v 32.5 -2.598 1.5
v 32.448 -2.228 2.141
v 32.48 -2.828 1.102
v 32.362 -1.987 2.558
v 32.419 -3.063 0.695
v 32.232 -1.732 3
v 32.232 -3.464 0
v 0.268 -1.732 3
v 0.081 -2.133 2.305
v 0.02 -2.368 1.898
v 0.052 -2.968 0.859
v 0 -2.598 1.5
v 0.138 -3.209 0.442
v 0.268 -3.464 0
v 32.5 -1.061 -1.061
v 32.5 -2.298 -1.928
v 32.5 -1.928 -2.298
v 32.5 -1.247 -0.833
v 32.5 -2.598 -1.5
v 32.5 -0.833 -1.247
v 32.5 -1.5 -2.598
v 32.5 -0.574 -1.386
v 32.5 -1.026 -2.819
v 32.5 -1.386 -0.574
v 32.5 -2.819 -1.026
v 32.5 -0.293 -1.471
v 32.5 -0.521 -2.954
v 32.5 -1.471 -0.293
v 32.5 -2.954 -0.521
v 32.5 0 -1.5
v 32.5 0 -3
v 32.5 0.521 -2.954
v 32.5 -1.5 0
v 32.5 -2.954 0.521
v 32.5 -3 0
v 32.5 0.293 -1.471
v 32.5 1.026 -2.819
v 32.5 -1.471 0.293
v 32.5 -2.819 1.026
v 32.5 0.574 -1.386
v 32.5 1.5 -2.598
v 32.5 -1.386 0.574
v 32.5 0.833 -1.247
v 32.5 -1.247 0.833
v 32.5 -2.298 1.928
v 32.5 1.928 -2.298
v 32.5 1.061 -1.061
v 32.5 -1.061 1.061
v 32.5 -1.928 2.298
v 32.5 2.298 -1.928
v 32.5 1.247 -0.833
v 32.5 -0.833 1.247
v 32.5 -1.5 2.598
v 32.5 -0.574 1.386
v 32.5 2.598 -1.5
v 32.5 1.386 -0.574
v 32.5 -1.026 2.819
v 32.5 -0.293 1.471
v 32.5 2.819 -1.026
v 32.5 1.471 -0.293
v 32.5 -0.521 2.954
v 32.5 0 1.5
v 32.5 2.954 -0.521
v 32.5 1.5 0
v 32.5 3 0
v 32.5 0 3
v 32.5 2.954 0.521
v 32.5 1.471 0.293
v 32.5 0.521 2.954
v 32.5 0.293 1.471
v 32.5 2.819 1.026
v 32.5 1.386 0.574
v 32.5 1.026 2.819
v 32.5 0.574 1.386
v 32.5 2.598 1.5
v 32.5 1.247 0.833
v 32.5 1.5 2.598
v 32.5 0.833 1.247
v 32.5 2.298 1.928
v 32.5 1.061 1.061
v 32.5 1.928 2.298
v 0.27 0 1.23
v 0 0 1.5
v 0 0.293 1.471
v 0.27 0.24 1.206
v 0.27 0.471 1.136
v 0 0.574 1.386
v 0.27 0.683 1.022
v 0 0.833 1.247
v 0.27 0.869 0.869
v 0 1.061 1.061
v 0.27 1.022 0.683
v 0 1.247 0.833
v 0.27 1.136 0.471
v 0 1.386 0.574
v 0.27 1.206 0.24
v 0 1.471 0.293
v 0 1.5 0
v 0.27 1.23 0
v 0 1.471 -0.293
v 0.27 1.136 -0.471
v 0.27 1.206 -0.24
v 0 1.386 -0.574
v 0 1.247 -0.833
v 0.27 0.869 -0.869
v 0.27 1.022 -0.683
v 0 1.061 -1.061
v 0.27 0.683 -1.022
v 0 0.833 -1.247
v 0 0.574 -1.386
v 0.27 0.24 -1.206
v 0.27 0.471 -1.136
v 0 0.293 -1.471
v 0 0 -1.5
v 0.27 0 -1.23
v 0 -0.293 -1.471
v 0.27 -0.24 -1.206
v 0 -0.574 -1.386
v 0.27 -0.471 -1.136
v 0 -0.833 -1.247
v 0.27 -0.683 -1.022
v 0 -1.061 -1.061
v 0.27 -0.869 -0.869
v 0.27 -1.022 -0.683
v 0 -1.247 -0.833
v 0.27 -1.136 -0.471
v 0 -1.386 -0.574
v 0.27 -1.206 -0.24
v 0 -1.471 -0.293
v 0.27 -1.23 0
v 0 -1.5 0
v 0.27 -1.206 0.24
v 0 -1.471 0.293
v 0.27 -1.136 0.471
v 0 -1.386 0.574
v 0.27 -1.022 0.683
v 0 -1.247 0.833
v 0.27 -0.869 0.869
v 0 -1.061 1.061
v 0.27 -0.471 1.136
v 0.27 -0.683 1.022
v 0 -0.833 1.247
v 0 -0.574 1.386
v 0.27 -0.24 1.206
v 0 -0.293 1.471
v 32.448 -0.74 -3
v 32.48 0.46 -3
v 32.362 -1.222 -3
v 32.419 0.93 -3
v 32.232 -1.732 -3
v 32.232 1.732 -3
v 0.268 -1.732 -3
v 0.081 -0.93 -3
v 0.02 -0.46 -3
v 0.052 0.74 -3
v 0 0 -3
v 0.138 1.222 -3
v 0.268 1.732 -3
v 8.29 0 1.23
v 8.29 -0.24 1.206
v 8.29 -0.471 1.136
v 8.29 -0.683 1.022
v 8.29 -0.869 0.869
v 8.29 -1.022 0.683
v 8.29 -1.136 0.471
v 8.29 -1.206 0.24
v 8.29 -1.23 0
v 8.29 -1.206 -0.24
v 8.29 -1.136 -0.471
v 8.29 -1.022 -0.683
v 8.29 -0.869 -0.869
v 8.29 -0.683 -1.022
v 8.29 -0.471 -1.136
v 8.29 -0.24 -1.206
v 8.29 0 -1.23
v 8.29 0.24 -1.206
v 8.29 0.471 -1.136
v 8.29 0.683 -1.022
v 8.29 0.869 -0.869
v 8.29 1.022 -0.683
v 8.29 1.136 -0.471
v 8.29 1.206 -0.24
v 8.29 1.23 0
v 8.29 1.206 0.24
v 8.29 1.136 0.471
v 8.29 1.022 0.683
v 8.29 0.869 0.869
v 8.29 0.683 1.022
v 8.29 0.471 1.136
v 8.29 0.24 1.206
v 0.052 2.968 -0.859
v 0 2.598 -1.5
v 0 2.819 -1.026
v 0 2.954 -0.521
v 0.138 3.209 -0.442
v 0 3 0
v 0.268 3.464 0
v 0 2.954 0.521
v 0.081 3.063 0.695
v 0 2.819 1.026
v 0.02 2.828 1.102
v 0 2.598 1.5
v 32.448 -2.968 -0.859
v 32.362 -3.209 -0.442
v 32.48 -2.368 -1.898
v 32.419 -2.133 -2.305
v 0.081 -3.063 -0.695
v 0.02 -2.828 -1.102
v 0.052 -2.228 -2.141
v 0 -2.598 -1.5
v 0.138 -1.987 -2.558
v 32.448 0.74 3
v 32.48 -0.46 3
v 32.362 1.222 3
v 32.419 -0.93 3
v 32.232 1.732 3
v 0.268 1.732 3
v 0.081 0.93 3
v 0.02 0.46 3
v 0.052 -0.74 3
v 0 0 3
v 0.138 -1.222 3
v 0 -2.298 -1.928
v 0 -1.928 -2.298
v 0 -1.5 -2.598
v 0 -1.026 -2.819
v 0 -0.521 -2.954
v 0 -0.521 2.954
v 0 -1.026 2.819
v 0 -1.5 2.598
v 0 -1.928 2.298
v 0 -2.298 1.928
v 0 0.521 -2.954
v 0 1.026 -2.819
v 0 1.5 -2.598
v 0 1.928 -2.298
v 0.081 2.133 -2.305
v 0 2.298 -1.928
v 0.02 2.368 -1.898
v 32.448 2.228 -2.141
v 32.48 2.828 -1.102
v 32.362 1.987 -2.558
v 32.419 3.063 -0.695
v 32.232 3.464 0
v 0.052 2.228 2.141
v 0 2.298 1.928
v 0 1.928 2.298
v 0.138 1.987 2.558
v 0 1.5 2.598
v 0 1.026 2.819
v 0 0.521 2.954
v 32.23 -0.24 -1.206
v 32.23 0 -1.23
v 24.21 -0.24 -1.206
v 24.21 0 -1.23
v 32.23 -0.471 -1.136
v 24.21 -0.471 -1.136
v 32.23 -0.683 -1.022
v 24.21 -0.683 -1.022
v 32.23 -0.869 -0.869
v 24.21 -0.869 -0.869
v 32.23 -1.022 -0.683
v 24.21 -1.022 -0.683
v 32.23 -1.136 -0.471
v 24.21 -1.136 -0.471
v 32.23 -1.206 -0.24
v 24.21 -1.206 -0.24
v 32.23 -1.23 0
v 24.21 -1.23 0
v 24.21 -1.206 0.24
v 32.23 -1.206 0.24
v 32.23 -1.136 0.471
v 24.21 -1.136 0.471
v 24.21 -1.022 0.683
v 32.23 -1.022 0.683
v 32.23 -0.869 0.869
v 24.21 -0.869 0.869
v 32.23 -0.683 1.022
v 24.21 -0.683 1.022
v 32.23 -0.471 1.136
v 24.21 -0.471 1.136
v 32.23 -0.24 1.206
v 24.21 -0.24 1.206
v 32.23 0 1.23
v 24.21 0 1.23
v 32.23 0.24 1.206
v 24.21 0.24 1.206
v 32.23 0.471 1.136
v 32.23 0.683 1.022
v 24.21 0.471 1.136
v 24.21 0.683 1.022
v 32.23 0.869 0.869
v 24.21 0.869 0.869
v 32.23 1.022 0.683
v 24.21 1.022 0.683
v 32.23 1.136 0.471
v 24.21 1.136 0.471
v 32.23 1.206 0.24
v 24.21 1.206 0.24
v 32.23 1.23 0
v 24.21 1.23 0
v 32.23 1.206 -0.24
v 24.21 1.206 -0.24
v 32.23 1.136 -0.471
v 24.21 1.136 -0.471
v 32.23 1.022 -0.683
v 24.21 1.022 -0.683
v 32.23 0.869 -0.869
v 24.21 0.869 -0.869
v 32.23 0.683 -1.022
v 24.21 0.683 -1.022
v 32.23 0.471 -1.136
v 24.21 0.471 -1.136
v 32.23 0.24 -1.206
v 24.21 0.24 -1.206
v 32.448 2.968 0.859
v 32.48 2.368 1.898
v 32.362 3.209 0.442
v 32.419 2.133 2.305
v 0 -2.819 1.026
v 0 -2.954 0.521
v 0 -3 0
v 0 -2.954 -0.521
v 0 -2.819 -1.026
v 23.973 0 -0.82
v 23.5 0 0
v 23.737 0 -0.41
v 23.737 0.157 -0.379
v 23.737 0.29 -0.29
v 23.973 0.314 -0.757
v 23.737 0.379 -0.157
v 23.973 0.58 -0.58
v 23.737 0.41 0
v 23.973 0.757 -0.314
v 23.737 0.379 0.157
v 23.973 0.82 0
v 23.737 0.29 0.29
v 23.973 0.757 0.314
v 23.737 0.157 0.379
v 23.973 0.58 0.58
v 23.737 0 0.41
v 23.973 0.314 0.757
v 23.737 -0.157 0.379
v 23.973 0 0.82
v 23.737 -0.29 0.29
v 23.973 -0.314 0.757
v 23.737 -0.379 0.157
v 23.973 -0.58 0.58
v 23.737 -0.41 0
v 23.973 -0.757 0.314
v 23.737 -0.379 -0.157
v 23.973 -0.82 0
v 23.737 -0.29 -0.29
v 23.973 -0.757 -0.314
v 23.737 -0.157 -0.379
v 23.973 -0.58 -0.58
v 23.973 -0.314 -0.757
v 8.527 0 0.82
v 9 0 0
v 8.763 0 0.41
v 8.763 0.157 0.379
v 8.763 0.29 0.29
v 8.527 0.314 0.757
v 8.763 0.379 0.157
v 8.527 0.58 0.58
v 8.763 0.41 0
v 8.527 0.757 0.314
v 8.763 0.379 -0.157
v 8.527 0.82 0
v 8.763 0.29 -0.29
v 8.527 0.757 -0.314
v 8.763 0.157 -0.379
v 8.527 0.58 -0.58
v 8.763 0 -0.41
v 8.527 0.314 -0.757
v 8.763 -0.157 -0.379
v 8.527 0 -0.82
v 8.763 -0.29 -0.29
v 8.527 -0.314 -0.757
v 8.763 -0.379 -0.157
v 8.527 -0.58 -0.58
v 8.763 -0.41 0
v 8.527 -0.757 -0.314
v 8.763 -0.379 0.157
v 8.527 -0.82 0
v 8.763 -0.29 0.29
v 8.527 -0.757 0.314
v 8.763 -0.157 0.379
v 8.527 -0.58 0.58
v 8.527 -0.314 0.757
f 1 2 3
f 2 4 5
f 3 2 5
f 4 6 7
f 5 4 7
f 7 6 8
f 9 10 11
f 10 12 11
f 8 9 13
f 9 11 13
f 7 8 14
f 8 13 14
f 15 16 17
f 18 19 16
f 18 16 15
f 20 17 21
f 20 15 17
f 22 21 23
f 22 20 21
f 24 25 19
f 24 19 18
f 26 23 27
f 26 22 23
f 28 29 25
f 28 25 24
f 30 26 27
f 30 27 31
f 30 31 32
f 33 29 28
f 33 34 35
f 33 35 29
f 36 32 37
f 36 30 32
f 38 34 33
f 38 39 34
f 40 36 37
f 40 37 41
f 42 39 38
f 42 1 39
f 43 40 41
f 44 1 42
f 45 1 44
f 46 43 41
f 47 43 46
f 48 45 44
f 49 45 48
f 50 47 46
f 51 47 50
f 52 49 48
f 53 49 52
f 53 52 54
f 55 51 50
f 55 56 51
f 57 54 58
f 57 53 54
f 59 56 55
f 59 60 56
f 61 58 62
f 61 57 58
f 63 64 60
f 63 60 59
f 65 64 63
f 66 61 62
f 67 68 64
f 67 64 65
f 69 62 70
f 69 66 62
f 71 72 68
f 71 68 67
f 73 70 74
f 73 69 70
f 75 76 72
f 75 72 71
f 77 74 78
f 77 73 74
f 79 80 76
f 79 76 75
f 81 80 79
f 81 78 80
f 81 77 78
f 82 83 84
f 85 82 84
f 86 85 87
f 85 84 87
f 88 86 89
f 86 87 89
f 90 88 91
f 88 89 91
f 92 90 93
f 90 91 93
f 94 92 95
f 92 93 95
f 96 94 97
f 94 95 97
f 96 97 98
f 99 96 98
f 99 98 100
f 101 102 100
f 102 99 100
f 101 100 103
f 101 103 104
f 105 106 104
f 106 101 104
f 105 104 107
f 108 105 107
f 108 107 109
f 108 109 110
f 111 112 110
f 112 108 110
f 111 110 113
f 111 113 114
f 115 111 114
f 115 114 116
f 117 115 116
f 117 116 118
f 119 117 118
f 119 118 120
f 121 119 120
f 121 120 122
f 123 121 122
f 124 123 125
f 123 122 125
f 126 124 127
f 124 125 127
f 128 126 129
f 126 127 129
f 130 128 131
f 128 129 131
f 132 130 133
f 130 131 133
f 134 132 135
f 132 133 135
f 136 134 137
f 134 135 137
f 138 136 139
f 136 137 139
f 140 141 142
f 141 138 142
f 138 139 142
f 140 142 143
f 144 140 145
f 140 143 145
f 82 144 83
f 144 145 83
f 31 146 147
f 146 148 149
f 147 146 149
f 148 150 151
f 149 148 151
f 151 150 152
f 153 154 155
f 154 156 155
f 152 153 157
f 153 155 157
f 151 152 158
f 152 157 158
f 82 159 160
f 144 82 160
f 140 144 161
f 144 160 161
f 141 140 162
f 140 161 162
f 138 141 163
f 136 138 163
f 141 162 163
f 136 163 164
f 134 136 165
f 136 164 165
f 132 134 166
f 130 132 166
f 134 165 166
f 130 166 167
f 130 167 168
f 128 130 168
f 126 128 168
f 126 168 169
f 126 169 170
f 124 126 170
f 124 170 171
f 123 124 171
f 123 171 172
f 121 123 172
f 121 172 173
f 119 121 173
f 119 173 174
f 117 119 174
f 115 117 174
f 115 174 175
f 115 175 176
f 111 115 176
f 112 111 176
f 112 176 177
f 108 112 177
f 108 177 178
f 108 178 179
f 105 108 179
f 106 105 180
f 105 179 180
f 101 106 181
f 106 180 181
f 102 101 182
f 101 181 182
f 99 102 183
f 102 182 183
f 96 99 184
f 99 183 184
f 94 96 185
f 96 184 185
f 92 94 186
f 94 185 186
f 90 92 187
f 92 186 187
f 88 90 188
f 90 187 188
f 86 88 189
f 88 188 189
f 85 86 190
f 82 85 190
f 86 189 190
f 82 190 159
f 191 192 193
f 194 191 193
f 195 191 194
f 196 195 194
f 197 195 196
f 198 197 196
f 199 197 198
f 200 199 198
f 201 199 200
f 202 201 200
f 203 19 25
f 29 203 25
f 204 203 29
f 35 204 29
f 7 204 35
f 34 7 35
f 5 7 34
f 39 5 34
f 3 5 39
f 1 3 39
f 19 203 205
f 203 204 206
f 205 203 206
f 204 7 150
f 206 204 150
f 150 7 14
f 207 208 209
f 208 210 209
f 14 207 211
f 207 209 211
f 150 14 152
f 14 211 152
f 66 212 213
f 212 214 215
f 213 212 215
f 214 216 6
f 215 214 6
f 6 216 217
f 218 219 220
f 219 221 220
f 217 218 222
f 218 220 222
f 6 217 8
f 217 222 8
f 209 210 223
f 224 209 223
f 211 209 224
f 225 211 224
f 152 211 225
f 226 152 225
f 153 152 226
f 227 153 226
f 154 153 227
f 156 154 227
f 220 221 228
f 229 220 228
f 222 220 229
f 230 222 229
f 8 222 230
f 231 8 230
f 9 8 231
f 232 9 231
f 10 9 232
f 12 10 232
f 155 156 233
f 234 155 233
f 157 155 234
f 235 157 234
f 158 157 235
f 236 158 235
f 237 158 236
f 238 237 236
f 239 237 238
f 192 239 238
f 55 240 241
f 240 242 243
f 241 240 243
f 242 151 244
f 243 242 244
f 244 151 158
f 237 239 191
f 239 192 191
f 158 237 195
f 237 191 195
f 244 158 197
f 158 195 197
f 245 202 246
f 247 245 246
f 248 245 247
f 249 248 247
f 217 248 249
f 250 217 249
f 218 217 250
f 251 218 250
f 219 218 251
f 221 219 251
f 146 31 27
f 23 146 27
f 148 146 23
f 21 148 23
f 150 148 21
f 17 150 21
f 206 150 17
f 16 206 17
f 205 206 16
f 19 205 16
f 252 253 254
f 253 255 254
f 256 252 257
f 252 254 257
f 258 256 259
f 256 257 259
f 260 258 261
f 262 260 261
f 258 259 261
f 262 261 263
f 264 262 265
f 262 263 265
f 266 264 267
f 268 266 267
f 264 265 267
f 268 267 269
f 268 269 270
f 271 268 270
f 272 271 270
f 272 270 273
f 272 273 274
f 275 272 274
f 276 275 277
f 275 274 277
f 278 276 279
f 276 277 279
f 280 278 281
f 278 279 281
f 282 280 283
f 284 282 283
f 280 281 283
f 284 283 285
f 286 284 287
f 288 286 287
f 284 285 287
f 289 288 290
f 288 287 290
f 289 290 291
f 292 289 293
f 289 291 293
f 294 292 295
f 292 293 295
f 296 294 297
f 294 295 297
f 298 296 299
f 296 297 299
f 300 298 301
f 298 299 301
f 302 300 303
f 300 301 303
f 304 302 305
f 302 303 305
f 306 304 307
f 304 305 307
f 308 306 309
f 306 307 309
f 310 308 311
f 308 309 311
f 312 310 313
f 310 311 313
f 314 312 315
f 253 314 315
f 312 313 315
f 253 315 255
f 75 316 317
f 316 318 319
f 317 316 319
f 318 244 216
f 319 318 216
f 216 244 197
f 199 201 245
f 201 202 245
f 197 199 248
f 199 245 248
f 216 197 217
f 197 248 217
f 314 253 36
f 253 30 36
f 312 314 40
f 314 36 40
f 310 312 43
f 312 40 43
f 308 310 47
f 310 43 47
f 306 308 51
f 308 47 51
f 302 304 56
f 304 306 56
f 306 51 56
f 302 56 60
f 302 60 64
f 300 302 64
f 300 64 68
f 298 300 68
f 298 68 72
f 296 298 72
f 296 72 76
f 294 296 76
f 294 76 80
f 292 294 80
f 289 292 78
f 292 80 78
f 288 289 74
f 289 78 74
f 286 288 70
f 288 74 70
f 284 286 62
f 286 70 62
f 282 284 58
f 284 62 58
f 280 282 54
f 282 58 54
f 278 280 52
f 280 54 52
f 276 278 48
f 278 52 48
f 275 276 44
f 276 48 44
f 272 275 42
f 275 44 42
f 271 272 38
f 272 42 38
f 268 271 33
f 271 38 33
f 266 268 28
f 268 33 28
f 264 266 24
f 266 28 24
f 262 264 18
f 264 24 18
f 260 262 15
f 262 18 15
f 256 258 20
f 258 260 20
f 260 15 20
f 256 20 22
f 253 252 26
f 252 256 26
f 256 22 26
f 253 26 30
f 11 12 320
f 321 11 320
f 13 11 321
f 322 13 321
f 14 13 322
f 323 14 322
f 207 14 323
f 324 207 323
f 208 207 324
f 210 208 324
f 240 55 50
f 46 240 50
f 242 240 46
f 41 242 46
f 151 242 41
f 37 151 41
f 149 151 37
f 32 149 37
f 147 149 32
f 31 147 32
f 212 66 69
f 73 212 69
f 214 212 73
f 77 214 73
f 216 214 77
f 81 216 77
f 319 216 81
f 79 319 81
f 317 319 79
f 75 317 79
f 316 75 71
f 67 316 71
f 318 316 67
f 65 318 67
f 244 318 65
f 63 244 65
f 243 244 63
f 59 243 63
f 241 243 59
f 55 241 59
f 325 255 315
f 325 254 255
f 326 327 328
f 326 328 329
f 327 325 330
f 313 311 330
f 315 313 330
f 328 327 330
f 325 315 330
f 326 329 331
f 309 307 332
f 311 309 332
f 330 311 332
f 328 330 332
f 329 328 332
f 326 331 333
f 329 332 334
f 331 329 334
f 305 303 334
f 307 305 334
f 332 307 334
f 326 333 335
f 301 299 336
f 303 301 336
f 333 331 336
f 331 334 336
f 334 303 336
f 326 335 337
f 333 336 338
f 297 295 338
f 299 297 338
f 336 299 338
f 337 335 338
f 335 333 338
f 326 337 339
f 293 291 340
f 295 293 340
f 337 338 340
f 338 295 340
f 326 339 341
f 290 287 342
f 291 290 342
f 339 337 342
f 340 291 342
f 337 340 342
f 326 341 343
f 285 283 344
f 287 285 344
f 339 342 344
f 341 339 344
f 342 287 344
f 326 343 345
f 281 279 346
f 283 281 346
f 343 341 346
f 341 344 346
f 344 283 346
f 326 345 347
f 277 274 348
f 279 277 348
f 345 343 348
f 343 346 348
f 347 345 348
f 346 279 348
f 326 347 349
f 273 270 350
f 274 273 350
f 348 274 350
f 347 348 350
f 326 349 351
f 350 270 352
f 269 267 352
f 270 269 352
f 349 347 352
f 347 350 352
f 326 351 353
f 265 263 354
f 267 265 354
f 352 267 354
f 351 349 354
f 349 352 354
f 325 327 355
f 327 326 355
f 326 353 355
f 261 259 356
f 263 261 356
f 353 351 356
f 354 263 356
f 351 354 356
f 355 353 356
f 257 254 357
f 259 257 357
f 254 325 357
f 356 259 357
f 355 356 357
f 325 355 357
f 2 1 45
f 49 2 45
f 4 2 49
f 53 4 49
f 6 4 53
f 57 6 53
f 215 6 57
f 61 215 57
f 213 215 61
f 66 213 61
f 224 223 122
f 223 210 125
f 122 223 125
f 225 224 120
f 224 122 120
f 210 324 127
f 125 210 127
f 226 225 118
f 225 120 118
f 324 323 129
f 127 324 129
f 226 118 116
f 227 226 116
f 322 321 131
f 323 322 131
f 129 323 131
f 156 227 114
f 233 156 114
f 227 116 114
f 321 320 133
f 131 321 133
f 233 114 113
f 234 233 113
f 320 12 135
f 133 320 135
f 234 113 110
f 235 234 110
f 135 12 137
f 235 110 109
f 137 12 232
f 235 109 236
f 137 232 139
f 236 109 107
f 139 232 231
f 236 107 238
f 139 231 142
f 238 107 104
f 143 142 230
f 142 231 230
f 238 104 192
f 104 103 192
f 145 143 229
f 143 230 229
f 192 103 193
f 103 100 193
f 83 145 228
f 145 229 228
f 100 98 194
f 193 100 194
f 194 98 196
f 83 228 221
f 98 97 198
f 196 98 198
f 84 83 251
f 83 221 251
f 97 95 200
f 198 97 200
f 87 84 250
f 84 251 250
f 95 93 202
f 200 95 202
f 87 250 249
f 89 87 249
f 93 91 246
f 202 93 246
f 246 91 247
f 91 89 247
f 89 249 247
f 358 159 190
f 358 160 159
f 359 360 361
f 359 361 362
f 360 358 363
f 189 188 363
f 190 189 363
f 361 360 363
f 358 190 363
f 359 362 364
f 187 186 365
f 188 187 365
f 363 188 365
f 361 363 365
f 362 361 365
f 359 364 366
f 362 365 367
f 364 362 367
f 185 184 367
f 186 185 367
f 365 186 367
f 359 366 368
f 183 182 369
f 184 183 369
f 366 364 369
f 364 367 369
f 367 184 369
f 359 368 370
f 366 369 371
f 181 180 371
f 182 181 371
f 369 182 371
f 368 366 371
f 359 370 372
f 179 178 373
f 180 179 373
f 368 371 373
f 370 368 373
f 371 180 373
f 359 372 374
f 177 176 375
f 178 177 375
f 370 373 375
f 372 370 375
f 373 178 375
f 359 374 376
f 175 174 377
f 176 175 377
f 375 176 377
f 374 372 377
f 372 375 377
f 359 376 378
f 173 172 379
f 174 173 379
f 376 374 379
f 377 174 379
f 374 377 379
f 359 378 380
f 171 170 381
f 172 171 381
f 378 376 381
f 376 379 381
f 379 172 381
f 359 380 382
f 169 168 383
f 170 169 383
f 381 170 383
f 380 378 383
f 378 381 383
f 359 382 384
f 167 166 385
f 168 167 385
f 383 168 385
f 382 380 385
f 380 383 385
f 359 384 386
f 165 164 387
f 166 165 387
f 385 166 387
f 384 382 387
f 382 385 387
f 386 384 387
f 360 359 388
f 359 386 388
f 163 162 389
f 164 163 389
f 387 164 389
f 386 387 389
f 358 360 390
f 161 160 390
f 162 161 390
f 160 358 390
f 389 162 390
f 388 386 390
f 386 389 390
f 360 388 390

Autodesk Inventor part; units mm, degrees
sketch "Sketch_1" plane through (0, 0, 0) normal (0, 0, 1) x (1, 0, 0)
  line L0 (32.5, 0) -> (0, 0)
  line L1 (0, 0) -> (0, 3)
  line L2 (0, 3) -> (0.5485, 3.95)
  line L3 (0.5485, 3.95) -> (31.9515, 3.95)
  line L4 (31.9515, 3.95) -> (32.5, 3)
  line L5 (32.5, 3) -> (32.5, 0)
  line L6 (32.5, 0) -> (0, 0)
revolve "Revolution1" add sketch "Sketch_1" angle 360 about axis through (32.5, 0, 0) along (1, 0, 0)
sketch "Sketch_2" plane through (0, 0, 0) normal (1, 0, 0) x (0, 1, 0)
  line L0 (6, 6) -> (-6, 6)
  line L1 (-6, 6) -> (-6, -6)
  line L2 (-6, -6) -> (6, -6)
  line L3 (6, -6) -> (6, 6)
  line L4 (-1.7321, 3) -> (-3.4641, 0)
  line L5 (-3.4641, 0) -> (-1.7321, -3)
  line L6 (-1.7321, -3) -> (1.7321, -3)
  line L7 (1.7321, -3) -> (3.4641, 0)
  line L8 (3.4641, 0) -> (1.7321, 3)
  line L9 (1.7321, 3) -> (-1.7321, 3)
extrude "Extrusion1" cut sketch "Sketch_2" along normal blind 32.5
sketch "Sketch3" plane through (0, 0, 0) normal (-1, 0, 0) x (0, 0, 1)
  point P0 (0, 0)
hole "Hole1" at (0, 0, 0) direction (1, 0, 0) diameter 2.459 depth 8.2901 tip angle 120 countersink diameter 3 countersink angle 90 thread size "M3x0.5" class "6H" standard "ISO Metric profile"
sketch "Sketch4" plane through (32.5, 0, 0) normal (1, 0, 0) x (0, 0, -1)
  point P0 (0, 0)
hole "Hole2" at (32.5, 0, 0) direction (-1, 0, 0) diameter 2.459 depth 8.2901 tip angle 120 countersink diameter 3 countersink angle 90 thread size "M3x0.5" class "6H" standard "ISO Metric profile"
ref_plane "C3_XY" through (32.5, 0, 0) normal (-1, 0, 0) x (0, 0, -1)
ref_plane "C3_YZ" through (32.5, 0, 0) normal (0, 0, -1) x (0, -1, 0)
ref_plane "C3_ZX" through (32.5, 0, 0) normal (0, -1, 0) x (-1, 0, 0)
properties part number "ABLSBF6-32.5-M3-N3" material "Aluminum 2014-T4"
